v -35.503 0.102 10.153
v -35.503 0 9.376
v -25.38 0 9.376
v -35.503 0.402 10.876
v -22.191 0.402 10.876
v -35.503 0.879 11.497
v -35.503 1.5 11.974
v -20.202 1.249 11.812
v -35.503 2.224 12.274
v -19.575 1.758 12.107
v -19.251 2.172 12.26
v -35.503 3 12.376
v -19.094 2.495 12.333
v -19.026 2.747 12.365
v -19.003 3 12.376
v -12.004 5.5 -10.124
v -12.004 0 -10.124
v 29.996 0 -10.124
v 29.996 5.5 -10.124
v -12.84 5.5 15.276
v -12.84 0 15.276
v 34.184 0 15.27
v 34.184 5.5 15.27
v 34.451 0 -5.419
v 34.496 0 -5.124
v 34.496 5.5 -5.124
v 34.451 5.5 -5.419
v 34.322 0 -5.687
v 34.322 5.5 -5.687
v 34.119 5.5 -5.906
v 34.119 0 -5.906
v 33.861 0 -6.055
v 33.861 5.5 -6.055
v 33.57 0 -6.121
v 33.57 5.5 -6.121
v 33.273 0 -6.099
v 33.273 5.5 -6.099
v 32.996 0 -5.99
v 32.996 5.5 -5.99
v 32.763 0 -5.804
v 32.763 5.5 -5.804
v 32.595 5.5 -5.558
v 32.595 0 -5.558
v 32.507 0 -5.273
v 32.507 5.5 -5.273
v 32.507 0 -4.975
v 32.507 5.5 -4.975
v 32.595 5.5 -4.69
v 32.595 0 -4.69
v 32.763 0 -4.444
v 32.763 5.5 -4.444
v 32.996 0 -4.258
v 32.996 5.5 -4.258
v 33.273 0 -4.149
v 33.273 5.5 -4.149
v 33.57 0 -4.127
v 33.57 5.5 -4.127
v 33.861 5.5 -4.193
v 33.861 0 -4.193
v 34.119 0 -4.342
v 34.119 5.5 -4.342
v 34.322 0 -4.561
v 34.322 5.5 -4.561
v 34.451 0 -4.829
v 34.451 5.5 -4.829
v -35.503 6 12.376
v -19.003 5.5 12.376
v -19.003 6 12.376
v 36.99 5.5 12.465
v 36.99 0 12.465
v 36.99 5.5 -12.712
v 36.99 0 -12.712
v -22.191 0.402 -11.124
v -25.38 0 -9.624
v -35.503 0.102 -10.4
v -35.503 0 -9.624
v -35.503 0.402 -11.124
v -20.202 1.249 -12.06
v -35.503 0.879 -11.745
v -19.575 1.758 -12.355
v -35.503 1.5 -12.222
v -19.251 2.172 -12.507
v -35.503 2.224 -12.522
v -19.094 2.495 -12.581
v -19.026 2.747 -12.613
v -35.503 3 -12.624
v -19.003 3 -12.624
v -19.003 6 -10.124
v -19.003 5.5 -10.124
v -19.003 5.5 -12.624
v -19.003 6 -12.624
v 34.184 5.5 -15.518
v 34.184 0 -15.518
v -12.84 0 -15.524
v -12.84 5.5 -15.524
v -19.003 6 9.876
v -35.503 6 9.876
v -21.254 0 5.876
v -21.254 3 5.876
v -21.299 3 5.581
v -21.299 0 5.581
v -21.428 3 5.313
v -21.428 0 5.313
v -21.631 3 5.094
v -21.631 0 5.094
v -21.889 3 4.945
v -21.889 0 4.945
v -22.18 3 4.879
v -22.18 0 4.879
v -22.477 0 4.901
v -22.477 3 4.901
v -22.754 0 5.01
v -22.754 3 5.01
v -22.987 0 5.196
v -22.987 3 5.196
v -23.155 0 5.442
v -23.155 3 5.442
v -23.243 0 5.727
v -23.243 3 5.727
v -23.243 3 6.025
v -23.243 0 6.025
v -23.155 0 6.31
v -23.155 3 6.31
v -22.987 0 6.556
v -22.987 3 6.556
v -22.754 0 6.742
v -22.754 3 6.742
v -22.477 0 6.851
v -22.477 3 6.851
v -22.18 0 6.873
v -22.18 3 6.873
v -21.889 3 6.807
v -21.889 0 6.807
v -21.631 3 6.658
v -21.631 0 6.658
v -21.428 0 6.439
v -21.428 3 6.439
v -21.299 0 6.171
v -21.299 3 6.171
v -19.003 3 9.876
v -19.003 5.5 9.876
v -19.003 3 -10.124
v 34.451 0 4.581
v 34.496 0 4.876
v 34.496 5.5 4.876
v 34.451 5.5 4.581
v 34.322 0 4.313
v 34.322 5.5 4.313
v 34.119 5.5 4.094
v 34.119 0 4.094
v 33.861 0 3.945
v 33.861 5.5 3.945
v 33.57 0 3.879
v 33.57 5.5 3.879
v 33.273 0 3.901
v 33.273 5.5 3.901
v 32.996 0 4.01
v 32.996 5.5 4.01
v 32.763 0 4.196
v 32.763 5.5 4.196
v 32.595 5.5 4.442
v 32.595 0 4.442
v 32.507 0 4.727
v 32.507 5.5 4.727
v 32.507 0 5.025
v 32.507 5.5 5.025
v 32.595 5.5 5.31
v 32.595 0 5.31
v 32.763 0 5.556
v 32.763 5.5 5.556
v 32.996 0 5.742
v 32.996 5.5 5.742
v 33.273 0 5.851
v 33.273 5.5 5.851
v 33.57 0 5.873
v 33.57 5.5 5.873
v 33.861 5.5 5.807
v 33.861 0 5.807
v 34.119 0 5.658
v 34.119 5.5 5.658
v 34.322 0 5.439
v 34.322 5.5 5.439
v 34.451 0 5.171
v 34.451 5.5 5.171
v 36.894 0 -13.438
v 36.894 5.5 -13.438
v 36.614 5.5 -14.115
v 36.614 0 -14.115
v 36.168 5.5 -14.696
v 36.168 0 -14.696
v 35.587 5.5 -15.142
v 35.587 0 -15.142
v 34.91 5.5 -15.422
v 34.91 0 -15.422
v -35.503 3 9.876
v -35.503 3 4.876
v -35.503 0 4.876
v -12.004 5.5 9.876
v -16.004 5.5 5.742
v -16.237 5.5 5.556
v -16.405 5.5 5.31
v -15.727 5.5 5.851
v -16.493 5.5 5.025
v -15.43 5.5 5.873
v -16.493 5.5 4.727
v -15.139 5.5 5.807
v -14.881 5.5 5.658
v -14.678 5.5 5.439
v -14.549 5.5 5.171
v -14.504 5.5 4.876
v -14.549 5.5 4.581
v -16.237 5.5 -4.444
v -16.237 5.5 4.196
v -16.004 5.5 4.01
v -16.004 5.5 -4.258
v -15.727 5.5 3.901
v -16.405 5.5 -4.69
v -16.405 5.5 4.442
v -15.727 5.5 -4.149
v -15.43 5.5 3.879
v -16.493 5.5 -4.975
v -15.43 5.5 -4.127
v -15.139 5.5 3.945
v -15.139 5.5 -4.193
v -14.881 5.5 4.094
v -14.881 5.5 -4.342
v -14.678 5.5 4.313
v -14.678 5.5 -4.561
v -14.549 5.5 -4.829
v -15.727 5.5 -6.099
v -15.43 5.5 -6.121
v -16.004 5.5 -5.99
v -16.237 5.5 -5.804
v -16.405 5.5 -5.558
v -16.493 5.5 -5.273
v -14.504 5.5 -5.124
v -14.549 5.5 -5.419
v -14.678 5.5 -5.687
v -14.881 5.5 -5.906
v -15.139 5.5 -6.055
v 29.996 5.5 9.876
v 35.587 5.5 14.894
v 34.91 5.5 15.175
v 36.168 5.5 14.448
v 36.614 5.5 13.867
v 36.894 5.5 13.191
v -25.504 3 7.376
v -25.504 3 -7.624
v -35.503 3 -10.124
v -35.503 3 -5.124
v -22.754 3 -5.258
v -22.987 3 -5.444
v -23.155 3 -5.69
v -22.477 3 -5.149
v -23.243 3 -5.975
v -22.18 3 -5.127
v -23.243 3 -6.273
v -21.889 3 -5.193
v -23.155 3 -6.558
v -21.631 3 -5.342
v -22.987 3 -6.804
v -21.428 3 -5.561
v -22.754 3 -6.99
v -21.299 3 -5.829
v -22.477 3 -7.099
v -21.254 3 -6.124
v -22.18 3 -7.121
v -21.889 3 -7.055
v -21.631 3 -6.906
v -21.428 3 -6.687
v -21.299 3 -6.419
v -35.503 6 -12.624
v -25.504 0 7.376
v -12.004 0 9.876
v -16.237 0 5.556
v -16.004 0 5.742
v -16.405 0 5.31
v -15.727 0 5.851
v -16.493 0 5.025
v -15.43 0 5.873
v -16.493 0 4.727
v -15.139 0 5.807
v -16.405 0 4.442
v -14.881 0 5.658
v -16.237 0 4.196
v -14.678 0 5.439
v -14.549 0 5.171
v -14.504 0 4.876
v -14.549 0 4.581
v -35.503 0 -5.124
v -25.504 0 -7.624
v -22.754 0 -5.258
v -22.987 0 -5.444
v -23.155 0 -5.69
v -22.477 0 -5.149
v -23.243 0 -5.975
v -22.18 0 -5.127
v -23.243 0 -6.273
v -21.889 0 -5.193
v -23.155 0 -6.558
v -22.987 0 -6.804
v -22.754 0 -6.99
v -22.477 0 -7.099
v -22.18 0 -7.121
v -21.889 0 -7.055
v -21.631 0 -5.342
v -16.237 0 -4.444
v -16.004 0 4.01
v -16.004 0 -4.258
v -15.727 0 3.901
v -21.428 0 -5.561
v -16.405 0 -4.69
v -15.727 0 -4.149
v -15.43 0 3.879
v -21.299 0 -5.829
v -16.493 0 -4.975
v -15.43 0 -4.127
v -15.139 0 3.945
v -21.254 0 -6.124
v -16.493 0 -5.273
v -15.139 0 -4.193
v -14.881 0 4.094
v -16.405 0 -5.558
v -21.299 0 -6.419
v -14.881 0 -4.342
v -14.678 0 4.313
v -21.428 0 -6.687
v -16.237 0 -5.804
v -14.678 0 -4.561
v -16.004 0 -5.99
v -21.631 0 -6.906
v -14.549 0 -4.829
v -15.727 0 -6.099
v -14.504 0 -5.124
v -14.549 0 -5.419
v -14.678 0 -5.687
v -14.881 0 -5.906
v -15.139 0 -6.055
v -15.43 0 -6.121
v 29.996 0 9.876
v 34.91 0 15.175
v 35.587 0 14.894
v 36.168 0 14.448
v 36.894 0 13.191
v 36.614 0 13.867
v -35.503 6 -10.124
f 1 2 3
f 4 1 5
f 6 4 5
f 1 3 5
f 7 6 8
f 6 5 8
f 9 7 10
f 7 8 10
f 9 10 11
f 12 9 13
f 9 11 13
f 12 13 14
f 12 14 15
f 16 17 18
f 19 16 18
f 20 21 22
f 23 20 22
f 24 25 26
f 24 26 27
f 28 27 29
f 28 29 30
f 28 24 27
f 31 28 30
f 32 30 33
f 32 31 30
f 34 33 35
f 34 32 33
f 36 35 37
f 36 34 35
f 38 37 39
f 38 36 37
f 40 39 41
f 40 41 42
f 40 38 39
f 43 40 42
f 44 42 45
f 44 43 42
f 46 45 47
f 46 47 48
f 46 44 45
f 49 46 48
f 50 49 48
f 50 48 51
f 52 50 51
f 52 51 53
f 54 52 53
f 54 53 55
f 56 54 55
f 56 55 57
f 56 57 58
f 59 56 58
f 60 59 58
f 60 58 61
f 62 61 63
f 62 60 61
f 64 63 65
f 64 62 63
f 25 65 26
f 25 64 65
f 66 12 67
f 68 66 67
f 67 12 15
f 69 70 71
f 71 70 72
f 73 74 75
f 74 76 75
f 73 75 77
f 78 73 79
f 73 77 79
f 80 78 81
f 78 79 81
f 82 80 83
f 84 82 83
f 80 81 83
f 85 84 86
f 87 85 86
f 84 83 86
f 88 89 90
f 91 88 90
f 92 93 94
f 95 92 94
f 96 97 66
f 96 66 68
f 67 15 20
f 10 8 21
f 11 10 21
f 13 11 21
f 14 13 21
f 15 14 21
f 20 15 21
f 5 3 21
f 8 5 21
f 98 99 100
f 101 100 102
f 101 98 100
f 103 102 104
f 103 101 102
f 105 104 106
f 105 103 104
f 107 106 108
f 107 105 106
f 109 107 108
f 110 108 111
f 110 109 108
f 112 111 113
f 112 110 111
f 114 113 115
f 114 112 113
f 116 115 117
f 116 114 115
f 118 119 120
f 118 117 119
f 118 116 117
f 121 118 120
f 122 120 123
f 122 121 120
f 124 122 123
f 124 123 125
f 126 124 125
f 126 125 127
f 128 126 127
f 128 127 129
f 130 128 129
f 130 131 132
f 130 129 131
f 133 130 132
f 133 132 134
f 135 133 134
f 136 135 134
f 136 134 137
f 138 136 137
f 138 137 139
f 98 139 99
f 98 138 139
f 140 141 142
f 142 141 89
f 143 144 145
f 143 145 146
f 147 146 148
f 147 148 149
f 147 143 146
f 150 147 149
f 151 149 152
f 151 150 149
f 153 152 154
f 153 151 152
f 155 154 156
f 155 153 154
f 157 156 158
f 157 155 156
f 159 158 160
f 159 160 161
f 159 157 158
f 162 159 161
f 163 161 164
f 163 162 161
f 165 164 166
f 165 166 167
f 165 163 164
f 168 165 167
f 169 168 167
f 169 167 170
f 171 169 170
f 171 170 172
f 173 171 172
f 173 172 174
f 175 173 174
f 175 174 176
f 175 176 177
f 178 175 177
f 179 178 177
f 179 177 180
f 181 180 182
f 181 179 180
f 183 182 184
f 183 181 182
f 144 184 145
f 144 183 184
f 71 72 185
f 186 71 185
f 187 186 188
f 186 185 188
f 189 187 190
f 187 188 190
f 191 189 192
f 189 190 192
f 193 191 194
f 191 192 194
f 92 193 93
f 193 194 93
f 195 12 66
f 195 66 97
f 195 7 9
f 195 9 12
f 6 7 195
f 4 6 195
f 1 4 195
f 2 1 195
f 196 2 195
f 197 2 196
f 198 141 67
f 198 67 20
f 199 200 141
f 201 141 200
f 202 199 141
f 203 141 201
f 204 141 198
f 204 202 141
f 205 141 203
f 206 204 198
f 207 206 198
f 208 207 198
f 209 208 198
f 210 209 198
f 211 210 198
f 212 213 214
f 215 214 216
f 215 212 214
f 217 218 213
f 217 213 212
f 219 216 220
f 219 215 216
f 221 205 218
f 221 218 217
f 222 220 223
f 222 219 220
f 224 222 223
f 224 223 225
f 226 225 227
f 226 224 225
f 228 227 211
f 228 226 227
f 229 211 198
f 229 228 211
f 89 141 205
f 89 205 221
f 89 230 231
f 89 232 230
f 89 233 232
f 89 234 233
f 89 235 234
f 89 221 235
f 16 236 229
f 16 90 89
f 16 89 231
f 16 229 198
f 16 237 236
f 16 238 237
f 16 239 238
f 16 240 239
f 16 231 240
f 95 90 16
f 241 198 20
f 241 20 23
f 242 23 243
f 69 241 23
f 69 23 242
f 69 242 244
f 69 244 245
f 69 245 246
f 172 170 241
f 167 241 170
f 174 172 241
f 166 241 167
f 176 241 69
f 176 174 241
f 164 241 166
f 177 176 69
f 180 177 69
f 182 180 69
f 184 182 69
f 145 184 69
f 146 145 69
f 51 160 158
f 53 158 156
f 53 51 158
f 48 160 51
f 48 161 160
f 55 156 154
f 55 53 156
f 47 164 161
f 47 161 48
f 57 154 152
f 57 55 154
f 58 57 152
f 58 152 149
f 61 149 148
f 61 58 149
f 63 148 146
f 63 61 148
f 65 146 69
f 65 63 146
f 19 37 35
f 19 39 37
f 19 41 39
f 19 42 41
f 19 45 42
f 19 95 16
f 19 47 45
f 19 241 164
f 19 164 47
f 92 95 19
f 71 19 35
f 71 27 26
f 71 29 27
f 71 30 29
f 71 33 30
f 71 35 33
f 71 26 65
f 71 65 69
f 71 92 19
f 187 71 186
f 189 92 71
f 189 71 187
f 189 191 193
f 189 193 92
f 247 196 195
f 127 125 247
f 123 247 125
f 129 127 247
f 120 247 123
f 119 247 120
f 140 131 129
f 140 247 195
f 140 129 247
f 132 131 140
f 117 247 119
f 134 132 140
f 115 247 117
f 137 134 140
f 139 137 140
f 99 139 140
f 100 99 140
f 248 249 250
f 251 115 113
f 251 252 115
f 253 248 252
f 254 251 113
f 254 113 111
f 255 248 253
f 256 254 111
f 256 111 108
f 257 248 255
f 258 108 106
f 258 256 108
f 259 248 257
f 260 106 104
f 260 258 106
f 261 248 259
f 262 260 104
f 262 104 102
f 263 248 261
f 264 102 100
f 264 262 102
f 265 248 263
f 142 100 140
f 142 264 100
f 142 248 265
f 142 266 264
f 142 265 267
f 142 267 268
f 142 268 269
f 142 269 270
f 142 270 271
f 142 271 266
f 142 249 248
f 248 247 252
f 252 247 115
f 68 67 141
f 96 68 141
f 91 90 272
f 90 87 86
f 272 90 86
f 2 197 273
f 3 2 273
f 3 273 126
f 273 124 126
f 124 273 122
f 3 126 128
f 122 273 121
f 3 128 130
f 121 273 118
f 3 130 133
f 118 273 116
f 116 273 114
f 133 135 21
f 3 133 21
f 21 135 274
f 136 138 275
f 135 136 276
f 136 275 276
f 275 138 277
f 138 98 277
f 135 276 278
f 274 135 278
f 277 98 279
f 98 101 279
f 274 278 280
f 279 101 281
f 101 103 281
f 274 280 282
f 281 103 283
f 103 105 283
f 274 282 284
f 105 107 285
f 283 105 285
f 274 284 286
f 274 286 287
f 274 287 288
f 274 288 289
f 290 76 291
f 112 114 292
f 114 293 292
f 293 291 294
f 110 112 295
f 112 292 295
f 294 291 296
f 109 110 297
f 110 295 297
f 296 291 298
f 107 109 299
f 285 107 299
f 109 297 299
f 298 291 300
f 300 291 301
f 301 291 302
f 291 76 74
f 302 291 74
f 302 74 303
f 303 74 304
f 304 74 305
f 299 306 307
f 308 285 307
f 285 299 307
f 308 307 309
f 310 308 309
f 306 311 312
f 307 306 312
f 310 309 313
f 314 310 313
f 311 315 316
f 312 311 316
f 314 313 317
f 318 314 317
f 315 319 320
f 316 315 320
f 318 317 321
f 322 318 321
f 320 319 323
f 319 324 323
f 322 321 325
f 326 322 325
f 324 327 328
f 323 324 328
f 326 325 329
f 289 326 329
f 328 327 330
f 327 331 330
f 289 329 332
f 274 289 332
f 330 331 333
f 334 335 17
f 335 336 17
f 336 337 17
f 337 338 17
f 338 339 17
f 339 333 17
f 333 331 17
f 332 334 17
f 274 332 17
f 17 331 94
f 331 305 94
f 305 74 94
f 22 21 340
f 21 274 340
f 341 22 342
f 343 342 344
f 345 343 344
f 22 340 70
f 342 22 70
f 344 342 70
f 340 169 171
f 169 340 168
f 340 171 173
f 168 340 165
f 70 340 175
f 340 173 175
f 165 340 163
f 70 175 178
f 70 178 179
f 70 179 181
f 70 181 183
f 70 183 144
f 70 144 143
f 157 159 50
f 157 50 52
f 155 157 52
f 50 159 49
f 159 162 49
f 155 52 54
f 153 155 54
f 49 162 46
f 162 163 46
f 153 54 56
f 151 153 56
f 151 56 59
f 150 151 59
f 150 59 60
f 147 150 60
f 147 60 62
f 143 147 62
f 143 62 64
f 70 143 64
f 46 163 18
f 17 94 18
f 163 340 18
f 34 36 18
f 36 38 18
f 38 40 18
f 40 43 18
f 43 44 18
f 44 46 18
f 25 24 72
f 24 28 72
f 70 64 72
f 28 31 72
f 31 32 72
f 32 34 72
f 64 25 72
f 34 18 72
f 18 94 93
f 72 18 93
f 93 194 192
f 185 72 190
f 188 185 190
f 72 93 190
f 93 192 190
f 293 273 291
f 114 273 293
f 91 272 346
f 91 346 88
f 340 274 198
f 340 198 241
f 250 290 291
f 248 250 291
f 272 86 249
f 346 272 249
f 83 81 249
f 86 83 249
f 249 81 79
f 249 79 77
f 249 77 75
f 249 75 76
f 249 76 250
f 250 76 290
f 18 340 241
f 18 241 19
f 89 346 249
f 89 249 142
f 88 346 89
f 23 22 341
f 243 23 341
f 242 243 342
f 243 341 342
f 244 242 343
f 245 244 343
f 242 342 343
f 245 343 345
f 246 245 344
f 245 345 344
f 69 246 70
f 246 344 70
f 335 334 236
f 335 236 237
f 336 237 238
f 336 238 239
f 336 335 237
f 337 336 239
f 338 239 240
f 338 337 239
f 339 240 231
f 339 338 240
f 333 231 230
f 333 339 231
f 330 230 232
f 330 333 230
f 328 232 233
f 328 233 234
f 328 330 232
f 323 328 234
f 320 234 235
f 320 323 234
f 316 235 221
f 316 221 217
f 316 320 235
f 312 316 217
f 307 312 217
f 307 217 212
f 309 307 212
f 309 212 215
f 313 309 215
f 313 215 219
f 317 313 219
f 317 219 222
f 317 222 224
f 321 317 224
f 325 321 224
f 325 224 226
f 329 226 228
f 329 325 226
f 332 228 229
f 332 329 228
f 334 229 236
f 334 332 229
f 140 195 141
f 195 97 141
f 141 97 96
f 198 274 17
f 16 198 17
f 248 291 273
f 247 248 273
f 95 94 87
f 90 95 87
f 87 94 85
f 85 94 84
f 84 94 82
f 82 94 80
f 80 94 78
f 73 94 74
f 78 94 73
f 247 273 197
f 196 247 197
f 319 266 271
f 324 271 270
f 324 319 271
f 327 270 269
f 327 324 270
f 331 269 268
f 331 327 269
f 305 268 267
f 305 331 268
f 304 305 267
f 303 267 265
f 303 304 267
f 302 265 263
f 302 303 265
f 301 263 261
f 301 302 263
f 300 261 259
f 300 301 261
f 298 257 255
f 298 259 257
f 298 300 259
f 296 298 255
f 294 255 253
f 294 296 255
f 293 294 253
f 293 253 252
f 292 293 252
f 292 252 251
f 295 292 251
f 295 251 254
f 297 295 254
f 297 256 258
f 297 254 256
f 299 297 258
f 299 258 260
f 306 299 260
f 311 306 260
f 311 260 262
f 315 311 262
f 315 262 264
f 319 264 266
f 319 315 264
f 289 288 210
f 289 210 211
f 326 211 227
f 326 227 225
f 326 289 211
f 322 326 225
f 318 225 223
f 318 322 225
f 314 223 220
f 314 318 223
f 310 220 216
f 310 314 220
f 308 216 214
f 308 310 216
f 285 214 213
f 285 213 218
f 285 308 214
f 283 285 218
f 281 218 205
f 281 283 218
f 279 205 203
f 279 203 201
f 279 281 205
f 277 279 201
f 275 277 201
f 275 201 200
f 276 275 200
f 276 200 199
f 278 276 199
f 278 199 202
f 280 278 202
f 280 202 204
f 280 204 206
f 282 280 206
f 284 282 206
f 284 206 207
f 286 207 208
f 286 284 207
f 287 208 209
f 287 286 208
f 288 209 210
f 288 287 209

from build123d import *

# Parameters (mm, degrees)
CROQUIS1_R              = 1.000000216
CROQUIS1_R_2            = 1.000000063
CROQUIS1_R_3            = 1.000000073
CROQUIS1_R_4            = 0.999999979
CROQUIS1_R_5            = 1.000000424
CROQUIS1_R_6            = 1.000000593
CROQUIS1_W              = 42
CROQUIS1_H              = 20
SALIENTE_EXTRUIR1_DEPTH = 5.5
CROQUIS2_W              = 16.5
CROQUIS2_H              = 2.5
SALIENTE_EXTRUIR2_DEPTH = 0.5
CROQUIS3_W              = 16.5
CROQUIS3_H              = 20
CORTAR_EXTRUIR1_DEPTH   = 2.5
REDONDEO1_R             = 3


with BuildPart() as part:
    # Croquis1 → Saliente-Extruir1 (new body)
    with BuildSketch(Plane(origin=(0, 0, 0), x_dir=(1, 0, 0), z_dir=(0, 1, 0))):
        with BuildLine():
            Line((-35.503347099, 12.623865495), (-35.503347099, 5.124115358))
            Line((-35.503347099, 5.124115358), (-25.50434655, 7.623865495))
            Line((-25.50434655, 7.623865495), (-25.50434655, -7.376134505))
            Line((-25.50434655, -7.376134505), (-35.503347099, -4.876384368))
            Line((-35.503347099, -4.876384368), (-35.503347099, -12.376134505))
            Line((-35.503347099, -12.376134505), (-19.003347099, -12.376134505))
            Line((-19.003347099, -12.376134505), (-12.8396222, -15.276134123))
            Line((-12.8396222, -15.276134123), (34.184025109, -15.270214667))
            ThreePointArc((34.184025109, -15.270214667), (36.167856769, -14.448338396), (36.98973304, -12.464506735))
            Line((36.98973304, -12.464506735), (36.98973304, 12.712237726))
            ThreePointArc((36.98973304, 12.712237726), (36.167960213, 14.69617283), (34.184025109, 15.517945657))
            Line((34.184025109, 15.517945657), (-12.8396222, 15.523865114))
            Line((-12.8396222, 15.523865114), (-19.003347099, 12.623865495))
            Line((-19.003347099, 12.623865495), (-35.503347099, 12.623865495))
        make_face()
        with Locations((-22.254346372, 6.123865279)):
            Circle(CROQUIS1_R, mode=Mode.SUBTRACT)
        with Locations((-15.504346839, 5.123865558)):
            Circle(CROQUIS1_R_2, mode=Mode.SUBTRACT)
        with Locations((33.495653377, 5.123865568)):
            Circle(CROQUIS1_R_3, mode=Mode.SUBTRACT)
        with Locations((33.4956531, -4.876133997)):
            Circle(CROQUIS1_R_4, mode=Mode.SUBTRACT)
        with Locations((-15.504347678, -4.876134927)):
            Circle(CROQUIS1_R_5, mode=Mode.SUBTRACT)
        with Locations((-22.254345484, -5.876135091)):
            Circle(CROQUIS1_R_6, mode=Mode.SUBTRACT)
        with Locations((8.99565345, 0.123865495)):
            Rectangle(CROQUIS1_W, CROQUIS1_H, mode=Mode.SUBTRACT)
    extrude(amount=SALIENTE_EXTRUIR1_DEPTH)

    # Croquis2 → Saliente-Extruir2 (add)
    with BuildSketch(Plane(origin=(0, 5.5, 0), x_dir=(1, 0, 0), z_dir=(0, 1, 0))):
        with Locations((-27.253347099, -11.126134505)):
            Rectangle(CROQUIS2_W, CROQUIS2_H)
        with Locations((-27.253347099, 11.373865495)):
            Rectangle(CROQUIS2_W, CROQUIS2_H)
    extrude(amount=SALIENTE_EXTRUIR2_DEPTH)

    # Croquis3 → Cortar-Extruir1 (cut)
    with BuildSketch(Plane(origin=(0, 5.5, 0), x_dir=(1, 0, 0), z_dir=(0, 1, 0))):
        with Locations((-27.253347099, 0.123865495)):
            Rectangle(CROQUIS3_W, CROQUIS3_H)
    extrude(amount=-CORTAR_EXTRUIR1_DEPTH, mode=Mode.SUBTRACT)

    # Redondeo1
    redondeo1_edges = [part.edges().sort_by_distance(p)[0] for p in [
        (-27.253347099, 0, 12.376134505),
        (-27.253347099, 0, -12.623865495),
    ]]
    fillet(redondeo1_edges, radius=REDONDEO1_R)


solid = part.part
